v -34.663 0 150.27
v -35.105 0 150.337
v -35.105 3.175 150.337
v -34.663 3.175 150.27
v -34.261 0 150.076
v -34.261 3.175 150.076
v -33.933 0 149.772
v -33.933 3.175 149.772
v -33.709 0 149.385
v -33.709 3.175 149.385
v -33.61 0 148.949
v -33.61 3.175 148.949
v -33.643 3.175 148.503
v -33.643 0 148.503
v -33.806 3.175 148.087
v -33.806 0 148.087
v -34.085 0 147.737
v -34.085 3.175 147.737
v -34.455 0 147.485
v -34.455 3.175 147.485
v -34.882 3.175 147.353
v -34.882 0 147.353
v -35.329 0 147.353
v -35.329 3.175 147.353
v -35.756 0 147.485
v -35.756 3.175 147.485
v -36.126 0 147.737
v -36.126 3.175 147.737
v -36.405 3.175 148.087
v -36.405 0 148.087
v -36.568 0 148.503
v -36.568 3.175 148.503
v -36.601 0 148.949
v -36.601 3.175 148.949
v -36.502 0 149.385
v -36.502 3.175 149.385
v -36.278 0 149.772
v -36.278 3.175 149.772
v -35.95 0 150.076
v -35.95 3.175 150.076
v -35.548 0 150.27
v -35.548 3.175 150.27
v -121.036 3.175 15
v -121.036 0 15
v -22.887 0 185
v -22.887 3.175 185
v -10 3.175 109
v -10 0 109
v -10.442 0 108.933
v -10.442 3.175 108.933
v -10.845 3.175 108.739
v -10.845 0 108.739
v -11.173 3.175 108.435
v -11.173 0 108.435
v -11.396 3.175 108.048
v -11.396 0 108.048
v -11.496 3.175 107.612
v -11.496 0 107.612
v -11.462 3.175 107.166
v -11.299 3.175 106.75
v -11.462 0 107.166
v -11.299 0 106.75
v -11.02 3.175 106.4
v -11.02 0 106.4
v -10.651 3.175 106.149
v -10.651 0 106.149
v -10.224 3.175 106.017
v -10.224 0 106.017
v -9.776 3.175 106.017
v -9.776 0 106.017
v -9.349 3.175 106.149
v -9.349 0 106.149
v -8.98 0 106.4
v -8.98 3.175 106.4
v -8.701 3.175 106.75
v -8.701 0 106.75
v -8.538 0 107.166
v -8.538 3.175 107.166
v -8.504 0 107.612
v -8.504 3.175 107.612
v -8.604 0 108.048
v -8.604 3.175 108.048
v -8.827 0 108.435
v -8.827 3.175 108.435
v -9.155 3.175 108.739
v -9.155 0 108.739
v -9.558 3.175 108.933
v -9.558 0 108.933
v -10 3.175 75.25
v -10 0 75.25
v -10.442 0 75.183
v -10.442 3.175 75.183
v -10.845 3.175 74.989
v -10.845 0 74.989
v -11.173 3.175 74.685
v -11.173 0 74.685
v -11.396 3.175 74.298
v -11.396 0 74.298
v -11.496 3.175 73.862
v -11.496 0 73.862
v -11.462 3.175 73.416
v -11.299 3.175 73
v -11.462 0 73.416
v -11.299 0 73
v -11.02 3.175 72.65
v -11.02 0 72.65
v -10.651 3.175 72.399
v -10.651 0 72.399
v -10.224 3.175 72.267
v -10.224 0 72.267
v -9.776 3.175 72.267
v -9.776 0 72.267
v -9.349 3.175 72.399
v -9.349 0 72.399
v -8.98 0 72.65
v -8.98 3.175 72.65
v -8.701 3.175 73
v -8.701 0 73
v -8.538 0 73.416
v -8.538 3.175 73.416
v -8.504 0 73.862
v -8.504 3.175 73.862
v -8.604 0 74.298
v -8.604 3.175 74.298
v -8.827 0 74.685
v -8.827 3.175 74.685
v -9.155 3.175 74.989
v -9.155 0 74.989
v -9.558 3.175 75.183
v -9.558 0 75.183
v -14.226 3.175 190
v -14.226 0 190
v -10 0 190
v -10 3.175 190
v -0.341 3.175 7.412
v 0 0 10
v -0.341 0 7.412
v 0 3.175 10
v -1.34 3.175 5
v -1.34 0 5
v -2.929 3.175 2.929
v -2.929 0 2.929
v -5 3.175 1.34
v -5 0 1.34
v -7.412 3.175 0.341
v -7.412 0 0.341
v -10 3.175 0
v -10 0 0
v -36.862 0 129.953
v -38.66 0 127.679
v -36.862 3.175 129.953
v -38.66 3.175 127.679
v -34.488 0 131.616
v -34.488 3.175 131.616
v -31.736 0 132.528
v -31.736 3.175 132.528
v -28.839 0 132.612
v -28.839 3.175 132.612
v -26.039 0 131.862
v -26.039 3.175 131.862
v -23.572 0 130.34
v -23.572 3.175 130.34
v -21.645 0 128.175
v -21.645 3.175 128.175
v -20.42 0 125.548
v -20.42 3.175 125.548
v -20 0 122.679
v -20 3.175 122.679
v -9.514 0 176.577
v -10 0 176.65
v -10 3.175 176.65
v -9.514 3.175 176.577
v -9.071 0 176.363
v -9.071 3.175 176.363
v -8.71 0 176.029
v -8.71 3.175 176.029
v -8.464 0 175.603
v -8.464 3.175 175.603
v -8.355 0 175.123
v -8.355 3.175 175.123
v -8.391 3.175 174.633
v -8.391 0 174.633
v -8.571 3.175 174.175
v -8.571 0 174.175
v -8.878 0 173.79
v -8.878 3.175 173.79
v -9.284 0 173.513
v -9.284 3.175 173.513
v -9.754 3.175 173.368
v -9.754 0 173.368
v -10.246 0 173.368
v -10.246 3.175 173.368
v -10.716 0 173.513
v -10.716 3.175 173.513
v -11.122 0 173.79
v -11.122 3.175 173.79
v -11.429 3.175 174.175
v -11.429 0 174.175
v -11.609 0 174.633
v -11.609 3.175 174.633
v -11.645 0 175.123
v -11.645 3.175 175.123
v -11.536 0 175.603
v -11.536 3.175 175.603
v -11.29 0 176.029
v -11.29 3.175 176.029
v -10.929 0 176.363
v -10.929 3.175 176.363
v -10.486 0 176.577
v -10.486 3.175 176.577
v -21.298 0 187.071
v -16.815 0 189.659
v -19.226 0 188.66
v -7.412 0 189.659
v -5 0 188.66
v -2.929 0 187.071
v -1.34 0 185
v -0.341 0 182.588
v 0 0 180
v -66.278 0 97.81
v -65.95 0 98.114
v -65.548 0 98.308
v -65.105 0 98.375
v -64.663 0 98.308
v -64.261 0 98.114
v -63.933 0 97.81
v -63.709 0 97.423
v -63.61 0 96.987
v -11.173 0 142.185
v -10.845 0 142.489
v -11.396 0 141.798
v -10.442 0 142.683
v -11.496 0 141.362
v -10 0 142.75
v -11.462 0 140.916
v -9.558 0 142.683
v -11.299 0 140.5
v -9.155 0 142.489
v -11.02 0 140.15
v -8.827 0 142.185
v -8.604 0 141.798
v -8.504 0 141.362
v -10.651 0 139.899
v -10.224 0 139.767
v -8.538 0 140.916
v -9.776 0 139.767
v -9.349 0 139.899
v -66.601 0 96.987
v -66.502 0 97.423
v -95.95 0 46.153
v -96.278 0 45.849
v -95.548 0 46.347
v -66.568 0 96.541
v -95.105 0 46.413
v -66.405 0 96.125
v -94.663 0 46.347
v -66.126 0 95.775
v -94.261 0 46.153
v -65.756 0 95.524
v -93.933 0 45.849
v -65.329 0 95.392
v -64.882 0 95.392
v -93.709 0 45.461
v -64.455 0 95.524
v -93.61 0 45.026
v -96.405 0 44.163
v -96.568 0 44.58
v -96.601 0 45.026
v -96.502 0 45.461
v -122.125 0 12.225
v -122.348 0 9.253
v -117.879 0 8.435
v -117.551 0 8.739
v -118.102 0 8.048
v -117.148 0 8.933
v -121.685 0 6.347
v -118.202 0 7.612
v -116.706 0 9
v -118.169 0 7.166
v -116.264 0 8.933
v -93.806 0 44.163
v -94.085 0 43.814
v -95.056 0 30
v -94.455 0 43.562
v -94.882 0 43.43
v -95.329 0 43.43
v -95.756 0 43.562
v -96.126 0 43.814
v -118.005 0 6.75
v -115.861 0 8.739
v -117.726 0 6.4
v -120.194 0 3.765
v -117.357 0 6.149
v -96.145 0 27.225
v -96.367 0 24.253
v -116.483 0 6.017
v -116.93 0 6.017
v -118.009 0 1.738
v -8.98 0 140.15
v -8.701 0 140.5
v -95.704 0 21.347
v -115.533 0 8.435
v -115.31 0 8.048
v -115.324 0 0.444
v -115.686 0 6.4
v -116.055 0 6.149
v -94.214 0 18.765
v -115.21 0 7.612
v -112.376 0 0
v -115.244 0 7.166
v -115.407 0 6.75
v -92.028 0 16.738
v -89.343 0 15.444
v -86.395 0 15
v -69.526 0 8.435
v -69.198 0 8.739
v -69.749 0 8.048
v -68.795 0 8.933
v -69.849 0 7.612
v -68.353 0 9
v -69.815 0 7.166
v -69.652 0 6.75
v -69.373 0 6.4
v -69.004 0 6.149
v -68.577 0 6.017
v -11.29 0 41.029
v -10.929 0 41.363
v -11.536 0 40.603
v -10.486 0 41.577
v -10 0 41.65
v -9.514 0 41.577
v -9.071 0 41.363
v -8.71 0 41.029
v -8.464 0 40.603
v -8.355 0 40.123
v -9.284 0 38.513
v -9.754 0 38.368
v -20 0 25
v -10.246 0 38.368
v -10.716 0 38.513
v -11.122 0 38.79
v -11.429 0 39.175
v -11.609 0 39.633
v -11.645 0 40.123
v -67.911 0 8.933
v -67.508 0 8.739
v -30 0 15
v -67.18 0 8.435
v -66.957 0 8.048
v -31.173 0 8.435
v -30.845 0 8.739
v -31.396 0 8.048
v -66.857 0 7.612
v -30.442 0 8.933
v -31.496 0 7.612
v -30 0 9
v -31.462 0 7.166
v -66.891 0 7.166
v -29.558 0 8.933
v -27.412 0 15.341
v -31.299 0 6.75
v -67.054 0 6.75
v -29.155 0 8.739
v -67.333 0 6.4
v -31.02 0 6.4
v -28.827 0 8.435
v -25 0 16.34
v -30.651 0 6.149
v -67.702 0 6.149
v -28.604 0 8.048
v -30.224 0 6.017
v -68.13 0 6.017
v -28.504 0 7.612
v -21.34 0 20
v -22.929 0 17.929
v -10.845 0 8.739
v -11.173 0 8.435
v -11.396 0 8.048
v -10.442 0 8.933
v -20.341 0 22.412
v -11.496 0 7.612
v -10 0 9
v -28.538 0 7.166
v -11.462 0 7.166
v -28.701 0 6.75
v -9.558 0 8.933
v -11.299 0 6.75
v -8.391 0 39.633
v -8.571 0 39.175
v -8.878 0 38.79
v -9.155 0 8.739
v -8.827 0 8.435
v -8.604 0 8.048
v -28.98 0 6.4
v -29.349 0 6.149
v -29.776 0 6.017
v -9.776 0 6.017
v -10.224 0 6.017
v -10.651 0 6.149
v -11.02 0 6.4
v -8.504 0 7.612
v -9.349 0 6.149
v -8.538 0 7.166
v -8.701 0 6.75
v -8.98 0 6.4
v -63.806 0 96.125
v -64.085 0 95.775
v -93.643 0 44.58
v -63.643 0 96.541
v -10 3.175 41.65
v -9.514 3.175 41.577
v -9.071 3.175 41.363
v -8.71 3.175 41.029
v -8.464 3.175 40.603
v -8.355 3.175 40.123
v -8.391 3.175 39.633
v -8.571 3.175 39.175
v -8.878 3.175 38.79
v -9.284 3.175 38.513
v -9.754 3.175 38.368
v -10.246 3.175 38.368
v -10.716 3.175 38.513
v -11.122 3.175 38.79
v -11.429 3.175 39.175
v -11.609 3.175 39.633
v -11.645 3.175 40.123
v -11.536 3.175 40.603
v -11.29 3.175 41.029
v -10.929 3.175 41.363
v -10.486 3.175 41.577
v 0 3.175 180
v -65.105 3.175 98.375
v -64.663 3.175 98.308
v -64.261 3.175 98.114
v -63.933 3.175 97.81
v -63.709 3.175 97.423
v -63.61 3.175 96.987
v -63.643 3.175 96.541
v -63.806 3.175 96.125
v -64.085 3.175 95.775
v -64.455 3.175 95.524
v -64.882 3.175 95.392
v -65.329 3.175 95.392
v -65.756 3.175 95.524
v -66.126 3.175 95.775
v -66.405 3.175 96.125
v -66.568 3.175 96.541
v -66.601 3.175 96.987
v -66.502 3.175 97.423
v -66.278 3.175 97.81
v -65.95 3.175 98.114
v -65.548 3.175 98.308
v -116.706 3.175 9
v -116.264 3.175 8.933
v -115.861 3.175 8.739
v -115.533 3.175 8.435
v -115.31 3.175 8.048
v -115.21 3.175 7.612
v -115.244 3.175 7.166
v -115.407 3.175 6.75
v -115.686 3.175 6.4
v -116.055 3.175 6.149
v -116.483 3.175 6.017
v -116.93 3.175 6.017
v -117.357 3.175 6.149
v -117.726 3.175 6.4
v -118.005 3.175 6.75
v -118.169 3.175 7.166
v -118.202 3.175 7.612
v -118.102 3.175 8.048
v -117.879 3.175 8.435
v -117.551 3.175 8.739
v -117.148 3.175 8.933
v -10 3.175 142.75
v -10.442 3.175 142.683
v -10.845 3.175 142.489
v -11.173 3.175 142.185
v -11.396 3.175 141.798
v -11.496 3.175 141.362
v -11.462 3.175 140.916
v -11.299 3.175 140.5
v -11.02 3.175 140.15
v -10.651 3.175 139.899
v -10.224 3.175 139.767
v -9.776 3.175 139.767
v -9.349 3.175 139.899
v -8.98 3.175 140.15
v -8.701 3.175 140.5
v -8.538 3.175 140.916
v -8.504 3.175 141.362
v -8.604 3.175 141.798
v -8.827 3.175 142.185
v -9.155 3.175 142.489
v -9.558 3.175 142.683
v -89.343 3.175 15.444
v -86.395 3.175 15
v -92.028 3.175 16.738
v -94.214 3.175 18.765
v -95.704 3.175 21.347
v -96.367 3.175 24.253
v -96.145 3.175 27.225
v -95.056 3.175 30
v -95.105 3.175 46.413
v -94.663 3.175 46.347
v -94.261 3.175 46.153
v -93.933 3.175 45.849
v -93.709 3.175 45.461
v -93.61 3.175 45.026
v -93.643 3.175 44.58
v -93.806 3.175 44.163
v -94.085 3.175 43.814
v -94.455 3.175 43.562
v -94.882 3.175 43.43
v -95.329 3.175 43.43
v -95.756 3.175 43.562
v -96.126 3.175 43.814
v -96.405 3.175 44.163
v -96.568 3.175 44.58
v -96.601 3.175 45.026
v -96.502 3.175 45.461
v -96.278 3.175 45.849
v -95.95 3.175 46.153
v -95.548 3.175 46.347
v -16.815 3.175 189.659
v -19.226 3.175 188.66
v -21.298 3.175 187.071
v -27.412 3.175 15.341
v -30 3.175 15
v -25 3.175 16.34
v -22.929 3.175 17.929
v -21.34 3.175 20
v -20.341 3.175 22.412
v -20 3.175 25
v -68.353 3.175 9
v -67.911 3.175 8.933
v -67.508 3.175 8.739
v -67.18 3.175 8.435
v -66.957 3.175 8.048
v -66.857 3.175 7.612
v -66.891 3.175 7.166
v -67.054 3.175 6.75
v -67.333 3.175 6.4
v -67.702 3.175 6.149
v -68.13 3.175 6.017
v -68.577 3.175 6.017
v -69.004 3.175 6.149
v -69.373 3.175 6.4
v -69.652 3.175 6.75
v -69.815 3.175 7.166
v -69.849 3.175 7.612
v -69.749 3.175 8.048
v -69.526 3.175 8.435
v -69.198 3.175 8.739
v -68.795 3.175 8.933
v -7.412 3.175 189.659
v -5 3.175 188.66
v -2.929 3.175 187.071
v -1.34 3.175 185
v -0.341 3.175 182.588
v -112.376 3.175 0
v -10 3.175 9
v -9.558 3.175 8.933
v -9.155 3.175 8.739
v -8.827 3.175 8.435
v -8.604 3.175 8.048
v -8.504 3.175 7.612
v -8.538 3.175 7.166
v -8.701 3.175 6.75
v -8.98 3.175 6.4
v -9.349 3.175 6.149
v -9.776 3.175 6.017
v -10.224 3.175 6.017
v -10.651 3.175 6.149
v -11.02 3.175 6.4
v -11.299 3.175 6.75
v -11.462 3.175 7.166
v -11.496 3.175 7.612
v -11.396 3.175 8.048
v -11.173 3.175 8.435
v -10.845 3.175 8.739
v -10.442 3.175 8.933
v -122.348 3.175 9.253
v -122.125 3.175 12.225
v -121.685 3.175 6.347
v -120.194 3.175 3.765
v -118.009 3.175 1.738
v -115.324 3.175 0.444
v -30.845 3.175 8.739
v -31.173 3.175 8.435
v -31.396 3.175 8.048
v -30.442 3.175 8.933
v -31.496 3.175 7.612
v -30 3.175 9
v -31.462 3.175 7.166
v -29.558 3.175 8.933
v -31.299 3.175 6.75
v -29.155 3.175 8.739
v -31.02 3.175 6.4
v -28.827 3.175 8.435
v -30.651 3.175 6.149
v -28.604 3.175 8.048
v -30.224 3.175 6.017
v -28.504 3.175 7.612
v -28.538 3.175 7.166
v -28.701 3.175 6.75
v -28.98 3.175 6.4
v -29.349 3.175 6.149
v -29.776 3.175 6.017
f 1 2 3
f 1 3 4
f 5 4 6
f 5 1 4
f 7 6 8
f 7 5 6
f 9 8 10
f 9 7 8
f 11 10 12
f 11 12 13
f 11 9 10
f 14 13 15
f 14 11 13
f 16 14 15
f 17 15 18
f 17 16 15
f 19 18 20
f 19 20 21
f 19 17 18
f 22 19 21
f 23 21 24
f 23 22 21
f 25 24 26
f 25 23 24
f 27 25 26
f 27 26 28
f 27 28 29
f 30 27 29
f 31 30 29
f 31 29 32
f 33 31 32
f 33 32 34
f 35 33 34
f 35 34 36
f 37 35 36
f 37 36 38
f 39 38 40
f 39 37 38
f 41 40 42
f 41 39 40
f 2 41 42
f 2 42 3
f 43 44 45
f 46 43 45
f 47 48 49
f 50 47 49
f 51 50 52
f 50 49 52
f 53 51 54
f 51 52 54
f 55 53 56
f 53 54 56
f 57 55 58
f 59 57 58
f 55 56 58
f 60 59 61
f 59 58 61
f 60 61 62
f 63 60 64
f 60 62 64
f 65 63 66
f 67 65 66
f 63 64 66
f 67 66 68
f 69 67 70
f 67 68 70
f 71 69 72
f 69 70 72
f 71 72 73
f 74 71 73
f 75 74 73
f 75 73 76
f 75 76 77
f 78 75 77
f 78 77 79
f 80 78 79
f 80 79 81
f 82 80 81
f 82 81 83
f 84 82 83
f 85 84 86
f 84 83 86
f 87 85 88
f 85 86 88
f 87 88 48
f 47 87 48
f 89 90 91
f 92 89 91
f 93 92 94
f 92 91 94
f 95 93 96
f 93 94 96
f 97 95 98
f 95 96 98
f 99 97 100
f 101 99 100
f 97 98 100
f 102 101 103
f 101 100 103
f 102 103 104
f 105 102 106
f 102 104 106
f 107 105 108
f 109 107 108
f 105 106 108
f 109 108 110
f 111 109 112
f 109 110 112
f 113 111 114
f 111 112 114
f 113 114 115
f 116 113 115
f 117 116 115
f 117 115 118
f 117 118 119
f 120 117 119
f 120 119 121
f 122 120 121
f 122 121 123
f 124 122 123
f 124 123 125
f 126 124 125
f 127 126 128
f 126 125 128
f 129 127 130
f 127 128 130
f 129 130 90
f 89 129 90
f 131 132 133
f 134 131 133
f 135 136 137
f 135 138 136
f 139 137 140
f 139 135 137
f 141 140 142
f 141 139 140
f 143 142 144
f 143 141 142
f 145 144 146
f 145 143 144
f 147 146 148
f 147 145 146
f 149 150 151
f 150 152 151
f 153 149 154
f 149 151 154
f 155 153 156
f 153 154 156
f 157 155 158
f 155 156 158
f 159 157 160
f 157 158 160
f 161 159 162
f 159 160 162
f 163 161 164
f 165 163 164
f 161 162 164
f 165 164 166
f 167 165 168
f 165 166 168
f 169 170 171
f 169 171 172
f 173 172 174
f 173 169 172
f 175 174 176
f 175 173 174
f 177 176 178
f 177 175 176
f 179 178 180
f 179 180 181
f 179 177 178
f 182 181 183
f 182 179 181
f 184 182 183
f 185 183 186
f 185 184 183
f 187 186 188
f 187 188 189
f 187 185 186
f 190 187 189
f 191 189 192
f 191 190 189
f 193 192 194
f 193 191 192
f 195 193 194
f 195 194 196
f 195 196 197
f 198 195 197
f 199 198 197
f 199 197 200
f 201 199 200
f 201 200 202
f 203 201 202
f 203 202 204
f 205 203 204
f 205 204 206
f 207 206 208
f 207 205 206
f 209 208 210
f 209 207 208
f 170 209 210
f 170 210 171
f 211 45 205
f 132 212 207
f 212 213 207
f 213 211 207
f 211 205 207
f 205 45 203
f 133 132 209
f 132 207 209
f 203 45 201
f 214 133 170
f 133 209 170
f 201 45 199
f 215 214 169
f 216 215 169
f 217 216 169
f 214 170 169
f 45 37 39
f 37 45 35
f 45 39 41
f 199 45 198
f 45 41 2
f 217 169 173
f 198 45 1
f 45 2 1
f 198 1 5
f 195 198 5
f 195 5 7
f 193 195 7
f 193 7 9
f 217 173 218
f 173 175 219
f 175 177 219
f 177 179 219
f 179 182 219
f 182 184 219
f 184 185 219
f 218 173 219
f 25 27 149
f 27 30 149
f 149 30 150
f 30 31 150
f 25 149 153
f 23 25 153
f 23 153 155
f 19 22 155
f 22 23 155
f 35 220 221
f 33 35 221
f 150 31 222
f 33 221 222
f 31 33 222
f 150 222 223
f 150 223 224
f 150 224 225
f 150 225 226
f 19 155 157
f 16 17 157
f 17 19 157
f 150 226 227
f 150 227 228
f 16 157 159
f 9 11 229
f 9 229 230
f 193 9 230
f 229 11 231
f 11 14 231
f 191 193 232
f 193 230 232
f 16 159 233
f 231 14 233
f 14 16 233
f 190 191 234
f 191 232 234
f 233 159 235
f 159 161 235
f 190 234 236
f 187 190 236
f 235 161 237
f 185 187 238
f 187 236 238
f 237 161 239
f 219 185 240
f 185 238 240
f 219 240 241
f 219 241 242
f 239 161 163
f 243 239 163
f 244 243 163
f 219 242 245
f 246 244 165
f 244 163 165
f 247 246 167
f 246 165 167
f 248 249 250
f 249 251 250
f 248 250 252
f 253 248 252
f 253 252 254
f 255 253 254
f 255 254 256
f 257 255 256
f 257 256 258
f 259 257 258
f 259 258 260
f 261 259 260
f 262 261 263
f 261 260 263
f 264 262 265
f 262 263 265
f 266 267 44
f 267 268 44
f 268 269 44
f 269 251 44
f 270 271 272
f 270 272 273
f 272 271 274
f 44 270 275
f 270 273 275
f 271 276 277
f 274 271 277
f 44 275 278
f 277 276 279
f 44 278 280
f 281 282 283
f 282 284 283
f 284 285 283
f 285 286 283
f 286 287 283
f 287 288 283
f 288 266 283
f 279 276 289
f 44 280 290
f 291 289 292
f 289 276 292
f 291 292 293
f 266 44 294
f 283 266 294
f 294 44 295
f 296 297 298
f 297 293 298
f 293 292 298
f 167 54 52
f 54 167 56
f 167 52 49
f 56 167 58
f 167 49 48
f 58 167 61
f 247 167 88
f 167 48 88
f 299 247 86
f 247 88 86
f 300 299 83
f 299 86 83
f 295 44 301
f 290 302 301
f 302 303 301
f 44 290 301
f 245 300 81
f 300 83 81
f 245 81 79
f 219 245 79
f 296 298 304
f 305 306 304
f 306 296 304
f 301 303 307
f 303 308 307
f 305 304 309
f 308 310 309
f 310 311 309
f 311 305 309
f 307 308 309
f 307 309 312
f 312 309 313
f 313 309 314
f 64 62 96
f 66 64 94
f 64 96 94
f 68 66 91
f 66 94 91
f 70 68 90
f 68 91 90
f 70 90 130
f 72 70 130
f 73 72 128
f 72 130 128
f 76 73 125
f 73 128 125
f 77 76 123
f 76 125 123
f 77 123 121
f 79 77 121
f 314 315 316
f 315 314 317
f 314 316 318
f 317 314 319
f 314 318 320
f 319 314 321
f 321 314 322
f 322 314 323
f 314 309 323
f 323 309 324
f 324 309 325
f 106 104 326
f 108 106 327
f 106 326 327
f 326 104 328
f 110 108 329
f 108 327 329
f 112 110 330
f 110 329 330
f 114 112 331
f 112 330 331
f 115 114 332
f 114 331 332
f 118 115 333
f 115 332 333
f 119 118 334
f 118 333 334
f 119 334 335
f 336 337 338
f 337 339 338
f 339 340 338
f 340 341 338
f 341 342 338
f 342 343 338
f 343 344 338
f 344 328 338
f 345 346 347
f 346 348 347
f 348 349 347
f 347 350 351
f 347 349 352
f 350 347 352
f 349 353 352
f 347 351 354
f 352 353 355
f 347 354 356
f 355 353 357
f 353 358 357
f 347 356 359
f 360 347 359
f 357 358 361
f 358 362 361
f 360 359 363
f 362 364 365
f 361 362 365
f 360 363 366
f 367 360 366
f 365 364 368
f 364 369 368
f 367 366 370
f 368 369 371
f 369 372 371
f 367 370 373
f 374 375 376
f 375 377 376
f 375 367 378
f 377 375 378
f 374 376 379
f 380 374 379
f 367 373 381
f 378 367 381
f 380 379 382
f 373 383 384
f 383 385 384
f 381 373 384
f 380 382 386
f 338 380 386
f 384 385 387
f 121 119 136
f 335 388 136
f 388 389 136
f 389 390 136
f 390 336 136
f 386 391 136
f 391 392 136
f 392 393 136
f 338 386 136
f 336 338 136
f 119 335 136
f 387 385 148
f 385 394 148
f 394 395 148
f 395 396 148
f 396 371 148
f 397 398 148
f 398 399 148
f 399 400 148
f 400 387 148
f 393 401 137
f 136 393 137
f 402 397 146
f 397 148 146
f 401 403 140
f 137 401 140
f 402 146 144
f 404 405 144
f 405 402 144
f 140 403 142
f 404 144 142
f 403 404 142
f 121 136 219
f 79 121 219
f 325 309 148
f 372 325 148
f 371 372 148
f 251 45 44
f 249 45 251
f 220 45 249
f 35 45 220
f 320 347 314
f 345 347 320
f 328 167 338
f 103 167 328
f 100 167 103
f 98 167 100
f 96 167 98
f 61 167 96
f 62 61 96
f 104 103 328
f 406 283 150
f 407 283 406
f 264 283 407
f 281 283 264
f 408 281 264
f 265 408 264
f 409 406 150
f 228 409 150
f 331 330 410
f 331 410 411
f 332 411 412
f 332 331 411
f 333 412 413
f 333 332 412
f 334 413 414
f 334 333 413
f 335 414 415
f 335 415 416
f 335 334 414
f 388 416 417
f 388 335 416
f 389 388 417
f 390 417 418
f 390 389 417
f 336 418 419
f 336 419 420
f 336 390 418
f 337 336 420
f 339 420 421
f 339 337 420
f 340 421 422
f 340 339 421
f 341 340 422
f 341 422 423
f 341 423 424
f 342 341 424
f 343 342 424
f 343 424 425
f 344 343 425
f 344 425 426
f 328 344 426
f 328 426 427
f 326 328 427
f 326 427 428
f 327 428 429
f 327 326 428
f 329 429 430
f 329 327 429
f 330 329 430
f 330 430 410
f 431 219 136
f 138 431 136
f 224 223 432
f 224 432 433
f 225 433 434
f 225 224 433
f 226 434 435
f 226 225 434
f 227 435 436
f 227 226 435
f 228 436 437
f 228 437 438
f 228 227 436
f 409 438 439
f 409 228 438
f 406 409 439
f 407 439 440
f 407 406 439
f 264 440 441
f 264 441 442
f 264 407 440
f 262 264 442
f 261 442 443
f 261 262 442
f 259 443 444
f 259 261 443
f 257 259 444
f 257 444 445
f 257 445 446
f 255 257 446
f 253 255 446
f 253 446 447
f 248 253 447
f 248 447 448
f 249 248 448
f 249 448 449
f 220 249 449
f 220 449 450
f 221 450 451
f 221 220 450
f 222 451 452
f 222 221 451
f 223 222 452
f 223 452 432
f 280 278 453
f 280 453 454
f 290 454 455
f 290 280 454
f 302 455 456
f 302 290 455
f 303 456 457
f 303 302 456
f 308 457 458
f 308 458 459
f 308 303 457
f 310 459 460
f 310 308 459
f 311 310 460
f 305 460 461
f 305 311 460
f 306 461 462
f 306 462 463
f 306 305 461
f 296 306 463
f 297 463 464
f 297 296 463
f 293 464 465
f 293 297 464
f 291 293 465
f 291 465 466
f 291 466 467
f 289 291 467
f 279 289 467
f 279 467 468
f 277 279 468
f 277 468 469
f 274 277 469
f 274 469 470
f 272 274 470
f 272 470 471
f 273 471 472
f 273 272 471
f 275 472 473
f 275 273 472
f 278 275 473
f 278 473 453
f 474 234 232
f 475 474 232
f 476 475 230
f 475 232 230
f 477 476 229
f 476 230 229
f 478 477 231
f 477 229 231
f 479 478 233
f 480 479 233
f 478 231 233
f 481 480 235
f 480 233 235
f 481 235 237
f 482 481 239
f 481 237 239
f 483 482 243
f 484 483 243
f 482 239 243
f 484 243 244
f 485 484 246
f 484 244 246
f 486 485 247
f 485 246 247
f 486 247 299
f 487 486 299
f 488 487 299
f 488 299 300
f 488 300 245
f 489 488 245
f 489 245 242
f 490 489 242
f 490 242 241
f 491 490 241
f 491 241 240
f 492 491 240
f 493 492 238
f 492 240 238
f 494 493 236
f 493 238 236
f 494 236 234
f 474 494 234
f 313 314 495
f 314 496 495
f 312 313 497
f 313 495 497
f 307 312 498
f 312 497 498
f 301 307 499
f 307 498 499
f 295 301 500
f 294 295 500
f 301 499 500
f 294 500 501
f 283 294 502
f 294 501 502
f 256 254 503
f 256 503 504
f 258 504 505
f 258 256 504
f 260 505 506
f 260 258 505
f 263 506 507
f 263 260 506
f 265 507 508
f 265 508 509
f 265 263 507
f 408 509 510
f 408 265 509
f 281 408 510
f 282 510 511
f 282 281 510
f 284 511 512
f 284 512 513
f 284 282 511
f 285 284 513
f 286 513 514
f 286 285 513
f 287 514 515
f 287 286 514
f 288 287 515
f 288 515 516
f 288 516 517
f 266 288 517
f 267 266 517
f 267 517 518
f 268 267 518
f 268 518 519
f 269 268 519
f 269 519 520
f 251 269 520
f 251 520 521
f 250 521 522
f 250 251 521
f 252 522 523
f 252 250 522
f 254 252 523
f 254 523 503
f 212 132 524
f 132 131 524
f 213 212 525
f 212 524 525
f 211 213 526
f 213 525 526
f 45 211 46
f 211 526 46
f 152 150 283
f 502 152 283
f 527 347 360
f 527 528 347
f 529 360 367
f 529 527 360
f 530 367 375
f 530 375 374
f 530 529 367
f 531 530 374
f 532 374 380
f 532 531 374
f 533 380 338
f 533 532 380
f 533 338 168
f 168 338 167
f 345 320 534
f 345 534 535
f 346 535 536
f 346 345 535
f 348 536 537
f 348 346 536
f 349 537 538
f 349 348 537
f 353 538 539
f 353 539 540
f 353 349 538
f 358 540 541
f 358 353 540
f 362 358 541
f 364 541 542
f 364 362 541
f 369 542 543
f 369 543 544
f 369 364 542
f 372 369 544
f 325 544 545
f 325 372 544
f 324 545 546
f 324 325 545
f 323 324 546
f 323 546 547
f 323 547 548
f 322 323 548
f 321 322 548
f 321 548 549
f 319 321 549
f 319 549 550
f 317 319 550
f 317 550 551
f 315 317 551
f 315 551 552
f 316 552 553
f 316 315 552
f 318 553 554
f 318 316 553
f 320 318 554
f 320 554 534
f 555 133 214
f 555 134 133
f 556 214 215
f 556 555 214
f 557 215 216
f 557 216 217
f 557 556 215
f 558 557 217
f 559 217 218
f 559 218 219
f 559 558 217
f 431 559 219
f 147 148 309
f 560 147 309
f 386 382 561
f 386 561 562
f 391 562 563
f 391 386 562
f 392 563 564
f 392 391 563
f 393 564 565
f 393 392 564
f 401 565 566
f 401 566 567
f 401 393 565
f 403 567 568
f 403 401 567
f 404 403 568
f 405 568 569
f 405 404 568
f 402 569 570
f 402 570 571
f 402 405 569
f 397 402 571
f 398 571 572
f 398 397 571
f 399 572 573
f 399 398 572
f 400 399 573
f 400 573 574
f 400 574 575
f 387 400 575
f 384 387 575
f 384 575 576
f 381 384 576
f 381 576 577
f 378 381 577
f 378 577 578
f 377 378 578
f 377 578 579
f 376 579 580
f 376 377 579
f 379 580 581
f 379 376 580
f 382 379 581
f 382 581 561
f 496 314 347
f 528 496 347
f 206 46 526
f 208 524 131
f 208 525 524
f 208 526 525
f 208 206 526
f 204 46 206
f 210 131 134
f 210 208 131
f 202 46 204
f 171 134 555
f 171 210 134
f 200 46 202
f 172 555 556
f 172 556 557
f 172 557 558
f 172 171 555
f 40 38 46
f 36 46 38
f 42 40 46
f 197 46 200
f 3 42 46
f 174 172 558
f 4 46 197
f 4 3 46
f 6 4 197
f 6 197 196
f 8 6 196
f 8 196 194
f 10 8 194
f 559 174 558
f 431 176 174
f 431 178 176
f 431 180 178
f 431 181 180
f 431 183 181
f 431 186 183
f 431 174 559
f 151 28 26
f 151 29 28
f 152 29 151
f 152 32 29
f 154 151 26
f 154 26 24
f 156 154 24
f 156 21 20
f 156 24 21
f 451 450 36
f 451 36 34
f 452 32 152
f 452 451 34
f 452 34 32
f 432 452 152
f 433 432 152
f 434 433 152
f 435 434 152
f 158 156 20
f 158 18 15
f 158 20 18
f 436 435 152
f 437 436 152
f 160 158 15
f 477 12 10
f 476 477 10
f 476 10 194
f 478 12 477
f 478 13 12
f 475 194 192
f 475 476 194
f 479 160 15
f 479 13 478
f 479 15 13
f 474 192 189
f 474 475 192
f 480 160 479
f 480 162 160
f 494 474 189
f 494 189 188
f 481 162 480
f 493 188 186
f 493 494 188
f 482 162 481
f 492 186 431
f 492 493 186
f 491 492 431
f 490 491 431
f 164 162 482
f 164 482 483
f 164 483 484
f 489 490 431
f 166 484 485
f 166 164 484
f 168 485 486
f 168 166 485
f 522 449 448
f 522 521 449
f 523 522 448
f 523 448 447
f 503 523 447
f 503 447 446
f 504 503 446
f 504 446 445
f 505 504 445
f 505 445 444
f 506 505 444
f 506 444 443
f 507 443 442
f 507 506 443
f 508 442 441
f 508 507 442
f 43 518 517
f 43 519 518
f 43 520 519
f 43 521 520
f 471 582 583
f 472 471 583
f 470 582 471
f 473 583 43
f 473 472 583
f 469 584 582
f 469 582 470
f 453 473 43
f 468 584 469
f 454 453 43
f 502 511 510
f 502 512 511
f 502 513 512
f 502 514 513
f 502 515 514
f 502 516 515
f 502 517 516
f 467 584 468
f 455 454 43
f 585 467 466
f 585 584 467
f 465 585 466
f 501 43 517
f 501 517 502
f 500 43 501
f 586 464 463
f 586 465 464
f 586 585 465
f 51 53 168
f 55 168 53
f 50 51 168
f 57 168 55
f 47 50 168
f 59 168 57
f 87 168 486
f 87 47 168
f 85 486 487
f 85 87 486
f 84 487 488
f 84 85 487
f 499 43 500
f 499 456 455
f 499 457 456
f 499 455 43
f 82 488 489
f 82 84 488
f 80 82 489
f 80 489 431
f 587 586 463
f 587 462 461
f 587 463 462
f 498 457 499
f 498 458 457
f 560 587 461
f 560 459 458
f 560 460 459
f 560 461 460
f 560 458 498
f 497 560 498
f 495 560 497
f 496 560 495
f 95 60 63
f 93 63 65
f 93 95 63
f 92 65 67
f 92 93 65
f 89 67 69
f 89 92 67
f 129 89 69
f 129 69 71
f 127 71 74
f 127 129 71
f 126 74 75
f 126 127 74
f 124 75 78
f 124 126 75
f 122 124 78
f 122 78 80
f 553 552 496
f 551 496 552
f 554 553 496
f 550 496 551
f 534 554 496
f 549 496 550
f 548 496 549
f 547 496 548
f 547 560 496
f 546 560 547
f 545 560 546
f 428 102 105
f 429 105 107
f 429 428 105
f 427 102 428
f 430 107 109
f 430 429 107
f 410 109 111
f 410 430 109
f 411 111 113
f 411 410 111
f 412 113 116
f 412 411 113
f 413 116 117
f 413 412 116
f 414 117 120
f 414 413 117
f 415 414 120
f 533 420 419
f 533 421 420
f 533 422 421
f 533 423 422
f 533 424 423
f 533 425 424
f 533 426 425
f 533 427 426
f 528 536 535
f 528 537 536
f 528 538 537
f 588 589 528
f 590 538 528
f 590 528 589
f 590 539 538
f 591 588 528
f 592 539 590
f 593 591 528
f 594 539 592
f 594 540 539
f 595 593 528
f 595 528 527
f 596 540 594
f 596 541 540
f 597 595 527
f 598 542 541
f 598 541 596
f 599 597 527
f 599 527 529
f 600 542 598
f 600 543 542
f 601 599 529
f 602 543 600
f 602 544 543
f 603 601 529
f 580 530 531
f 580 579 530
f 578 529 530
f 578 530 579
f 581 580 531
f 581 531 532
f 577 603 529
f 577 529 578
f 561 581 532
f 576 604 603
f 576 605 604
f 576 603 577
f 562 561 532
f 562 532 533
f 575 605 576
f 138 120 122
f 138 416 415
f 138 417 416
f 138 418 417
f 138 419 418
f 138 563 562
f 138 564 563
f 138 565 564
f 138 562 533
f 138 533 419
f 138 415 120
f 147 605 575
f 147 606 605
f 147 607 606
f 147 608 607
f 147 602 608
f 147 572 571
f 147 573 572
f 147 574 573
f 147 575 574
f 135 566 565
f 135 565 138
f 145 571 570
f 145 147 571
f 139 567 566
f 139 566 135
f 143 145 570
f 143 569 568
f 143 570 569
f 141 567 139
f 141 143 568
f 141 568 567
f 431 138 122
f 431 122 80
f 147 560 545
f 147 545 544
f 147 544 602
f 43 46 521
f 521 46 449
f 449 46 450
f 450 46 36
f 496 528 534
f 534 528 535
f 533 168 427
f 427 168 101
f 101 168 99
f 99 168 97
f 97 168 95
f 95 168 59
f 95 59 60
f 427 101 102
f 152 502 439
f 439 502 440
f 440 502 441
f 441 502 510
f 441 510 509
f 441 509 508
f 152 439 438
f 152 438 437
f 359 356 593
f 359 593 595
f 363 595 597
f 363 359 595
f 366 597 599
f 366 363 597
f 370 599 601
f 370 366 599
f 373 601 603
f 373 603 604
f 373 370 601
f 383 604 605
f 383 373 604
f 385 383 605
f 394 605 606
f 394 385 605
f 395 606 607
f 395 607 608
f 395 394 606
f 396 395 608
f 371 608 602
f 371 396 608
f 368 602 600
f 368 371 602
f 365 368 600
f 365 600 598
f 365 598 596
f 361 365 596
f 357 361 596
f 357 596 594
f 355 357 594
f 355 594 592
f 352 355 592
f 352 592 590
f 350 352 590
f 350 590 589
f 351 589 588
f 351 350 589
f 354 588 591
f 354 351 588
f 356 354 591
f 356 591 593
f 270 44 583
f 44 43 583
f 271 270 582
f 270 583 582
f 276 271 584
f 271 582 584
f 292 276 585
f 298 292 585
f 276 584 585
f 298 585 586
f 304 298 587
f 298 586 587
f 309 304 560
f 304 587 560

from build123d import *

# Parameters (mm, degrees)
SKETCH1_R           = 1.5
SKETCH1_R_2         = 1.65
BOSS_EXTRUDE1_DEPTH = 3.175
FILLET1_R           = 10


with BuildPart() as part:
    # Sketch1 → Boss-Extrude1 (new body)
    with BuildSketch(Plane(origin=(0, 0, 0), x_dir=(1, 0, 0), z_dir=(0, 1, 0))):
        Polygon((-20, -190), (0, -190), (0, 0), (-129.696551146, 0), align=None)
        with Locations(Location((-65.10548978, -96.875, 0), (0, 0, 270))):
            Circle(SKETCH1_R, mode=Mode.SUBTRACT)
        with Locations(Location((-10, -175, 0), (0, 0, 270))):
            Circle(SKETCH1_R_2, mode=Mode.SUBTRACT)
        with Locations(Location((-35.10548978, -148.836524227, 0), (0, 0, 270))):
            Circle(SKETCH1_R, mode=Mode.SUBTRACT)
        with BuildLine():
            ThreePointArc((-10, -139.75), (-8.5, -141.25), (-10, -142.75))
            ThreePointArc((-10, -142.75), (-11.5, -141.25), (-10, -139.75))
        make_face(mode=Mode.SUBTRACT)
        with BuildLine():
            ThreePointArc((-10, -106), (-8.5, -107.5), (-10, -109))
            ThreePointArc((-10, -109), (-11.5, -107.5), (-10, -106))
        make_face(mode=Mode.SUBTRACT)
        with Locations(Location((-95.10548978, -44.913475773, 0), (0, 0, 270))):
            Circle(SKETCH1_R, mode=Mode.SUBTRACT)
        with Locations(Location((-116.706170089, -7.5, 0), (0, 0, 270))):
            Circle(SKETCH1_R, mode=Mode.SUBTRACT)
        with Locations(Location((-68.353085045, -7.5, 0), (0, 0, 270))):
            Circle(SKETCH1_R, mode=Mode.SUBTRACT)
        Polygon((-20, -15), (-20, -160), (-103.715789032, -15), align=None, mode=Mode.SUBTRACT)
        with BuildLine():
            ThreePointArc((-10, -72.25), (-8.5, -73.75), (-10, -75.25))
            ThreePointArc((-10, -75.25), (-11.5, -73.75), (-10, -72.25))
        make_face(mode=Mode.SUBTRACT)
        with Locations(Location((-10, -40, 0), (0, 0, 270))):
            Circle(SKETCH1_R_2, mode=Mode.SUBTRACT)
        with Locations(Location((-30, -7.5, 0), (0, 0, 270))):
            Circle(SKETCH1_R, mode=Mode.SUBTRACT)
        with Locations(Location((-10, -7.5, 0), (0, 0, 270))):
            Circle(SKETCH1_R, mode=Mode.SUBTRACT)
    extrude(amount=BOSS_EXTRUDE1_DEPTH)

    # Fillet1
    fillet1_edges = [part.edges().sort_by_distance(p)[0] for p in [
        (-20, 1.5875, 15),
        (-103.715789032, 1.5875, 15),
        (-20, 1.5875, 160),
        (-129.696551146, 1.5875, 0),
        (0, 1.5875, 0),
        (0, 1.5875, 190),
        (-20, 1.5875, 190),
    ]]
    fillet(fillet1_edges, radius=FILLET1_R)


solid = part.part
